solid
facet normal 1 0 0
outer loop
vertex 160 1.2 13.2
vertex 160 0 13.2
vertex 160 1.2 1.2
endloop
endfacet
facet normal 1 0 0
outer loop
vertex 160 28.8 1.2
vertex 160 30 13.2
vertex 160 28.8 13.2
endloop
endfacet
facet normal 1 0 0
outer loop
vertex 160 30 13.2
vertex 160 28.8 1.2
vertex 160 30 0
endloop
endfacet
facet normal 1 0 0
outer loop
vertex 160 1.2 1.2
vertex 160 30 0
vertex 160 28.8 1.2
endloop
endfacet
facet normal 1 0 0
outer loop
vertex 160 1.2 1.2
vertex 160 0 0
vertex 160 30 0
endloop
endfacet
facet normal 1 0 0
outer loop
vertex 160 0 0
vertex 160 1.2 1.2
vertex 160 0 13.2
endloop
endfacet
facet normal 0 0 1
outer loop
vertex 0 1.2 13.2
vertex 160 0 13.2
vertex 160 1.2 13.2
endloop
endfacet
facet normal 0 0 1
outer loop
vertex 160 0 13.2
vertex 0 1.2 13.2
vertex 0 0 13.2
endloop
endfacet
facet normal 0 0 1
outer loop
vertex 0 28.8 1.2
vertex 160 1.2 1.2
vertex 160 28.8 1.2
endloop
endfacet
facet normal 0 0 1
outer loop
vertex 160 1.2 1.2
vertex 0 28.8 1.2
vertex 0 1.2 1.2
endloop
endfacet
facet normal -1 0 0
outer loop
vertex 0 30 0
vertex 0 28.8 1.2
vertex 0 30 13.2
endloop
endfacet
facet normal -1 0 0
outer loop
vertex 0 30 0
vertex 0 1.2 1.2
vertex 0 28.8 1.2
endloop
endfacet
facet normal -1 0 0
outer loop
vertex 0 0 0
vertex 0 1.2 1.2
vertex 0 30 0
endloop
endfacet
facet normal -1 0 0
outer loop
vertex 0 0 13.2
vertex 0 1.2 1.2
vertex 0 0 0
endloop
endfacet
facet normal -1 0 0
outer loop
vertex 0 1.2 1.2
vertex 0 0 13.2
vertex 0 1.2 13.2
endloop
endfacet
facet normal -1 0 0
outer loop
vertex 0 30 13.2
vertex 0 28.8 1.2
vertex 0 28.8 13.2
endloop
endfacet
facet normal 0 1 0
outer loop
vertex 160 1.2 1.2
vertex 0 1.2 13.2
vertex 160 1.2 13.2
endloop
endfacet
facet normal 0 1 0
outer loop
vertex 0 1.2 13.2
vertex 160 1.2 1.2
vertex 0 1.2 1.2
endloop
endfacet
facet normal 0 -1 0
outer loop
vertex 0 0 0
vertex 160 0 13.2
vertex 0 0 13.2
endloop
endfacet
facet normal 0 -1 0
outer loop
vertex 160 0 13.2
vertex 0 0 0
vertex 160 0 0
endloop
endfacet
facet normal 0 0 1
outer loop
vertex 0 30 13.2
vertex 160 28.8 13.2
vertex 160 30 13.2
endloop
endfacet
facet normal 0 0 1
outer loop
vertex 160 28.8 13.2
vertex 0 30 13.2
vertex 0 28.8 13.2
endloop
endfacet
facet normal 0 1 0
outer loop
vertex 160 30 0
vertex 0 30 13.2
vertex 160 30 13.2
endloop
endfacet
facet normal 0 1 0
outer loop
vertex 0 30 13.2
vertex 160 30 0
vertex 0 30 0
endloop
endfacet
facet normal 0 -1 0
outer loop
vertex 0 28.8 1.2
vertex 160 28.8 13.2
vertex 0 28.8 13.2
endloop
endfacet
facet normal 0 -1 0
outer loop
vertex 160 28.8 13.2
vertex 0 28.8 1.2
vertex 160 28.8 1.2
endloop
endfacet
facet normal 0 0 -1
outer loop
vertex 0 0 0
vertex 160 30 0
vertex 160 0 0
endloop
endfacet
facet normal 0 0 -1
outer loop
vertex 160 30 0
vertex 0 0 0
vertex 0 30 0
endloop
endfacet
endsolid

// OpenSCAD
// ScienceClaw nominal U-channel. All dimensions in millimeters.
// Clamp the first clamp_length along x. No holes or clamp reinforcement.
// Print parameters, layer orientation, material batch, and actual dimensions
// must be recorded separately; this file does not prescribe a qualified process.
length = 160;
clamp_length = 25;
base_width = 30;
wall_height = 12;
thickness = 1.2;
assert(length > clamp_length && clamp_length > 0);
assert(base_width > 2 * thickness && thickness > 0 && wall_height >= 0);
union() {
    cube([length, base_width, thickness]);
    if (wall_height > 0) {
        translate([0, 0, thickness]) cube([length, thickness, wall_height]);
        translate([0, base_width - thickness, thickness]) cube([length, thickness, wall_height]);
    }
}
